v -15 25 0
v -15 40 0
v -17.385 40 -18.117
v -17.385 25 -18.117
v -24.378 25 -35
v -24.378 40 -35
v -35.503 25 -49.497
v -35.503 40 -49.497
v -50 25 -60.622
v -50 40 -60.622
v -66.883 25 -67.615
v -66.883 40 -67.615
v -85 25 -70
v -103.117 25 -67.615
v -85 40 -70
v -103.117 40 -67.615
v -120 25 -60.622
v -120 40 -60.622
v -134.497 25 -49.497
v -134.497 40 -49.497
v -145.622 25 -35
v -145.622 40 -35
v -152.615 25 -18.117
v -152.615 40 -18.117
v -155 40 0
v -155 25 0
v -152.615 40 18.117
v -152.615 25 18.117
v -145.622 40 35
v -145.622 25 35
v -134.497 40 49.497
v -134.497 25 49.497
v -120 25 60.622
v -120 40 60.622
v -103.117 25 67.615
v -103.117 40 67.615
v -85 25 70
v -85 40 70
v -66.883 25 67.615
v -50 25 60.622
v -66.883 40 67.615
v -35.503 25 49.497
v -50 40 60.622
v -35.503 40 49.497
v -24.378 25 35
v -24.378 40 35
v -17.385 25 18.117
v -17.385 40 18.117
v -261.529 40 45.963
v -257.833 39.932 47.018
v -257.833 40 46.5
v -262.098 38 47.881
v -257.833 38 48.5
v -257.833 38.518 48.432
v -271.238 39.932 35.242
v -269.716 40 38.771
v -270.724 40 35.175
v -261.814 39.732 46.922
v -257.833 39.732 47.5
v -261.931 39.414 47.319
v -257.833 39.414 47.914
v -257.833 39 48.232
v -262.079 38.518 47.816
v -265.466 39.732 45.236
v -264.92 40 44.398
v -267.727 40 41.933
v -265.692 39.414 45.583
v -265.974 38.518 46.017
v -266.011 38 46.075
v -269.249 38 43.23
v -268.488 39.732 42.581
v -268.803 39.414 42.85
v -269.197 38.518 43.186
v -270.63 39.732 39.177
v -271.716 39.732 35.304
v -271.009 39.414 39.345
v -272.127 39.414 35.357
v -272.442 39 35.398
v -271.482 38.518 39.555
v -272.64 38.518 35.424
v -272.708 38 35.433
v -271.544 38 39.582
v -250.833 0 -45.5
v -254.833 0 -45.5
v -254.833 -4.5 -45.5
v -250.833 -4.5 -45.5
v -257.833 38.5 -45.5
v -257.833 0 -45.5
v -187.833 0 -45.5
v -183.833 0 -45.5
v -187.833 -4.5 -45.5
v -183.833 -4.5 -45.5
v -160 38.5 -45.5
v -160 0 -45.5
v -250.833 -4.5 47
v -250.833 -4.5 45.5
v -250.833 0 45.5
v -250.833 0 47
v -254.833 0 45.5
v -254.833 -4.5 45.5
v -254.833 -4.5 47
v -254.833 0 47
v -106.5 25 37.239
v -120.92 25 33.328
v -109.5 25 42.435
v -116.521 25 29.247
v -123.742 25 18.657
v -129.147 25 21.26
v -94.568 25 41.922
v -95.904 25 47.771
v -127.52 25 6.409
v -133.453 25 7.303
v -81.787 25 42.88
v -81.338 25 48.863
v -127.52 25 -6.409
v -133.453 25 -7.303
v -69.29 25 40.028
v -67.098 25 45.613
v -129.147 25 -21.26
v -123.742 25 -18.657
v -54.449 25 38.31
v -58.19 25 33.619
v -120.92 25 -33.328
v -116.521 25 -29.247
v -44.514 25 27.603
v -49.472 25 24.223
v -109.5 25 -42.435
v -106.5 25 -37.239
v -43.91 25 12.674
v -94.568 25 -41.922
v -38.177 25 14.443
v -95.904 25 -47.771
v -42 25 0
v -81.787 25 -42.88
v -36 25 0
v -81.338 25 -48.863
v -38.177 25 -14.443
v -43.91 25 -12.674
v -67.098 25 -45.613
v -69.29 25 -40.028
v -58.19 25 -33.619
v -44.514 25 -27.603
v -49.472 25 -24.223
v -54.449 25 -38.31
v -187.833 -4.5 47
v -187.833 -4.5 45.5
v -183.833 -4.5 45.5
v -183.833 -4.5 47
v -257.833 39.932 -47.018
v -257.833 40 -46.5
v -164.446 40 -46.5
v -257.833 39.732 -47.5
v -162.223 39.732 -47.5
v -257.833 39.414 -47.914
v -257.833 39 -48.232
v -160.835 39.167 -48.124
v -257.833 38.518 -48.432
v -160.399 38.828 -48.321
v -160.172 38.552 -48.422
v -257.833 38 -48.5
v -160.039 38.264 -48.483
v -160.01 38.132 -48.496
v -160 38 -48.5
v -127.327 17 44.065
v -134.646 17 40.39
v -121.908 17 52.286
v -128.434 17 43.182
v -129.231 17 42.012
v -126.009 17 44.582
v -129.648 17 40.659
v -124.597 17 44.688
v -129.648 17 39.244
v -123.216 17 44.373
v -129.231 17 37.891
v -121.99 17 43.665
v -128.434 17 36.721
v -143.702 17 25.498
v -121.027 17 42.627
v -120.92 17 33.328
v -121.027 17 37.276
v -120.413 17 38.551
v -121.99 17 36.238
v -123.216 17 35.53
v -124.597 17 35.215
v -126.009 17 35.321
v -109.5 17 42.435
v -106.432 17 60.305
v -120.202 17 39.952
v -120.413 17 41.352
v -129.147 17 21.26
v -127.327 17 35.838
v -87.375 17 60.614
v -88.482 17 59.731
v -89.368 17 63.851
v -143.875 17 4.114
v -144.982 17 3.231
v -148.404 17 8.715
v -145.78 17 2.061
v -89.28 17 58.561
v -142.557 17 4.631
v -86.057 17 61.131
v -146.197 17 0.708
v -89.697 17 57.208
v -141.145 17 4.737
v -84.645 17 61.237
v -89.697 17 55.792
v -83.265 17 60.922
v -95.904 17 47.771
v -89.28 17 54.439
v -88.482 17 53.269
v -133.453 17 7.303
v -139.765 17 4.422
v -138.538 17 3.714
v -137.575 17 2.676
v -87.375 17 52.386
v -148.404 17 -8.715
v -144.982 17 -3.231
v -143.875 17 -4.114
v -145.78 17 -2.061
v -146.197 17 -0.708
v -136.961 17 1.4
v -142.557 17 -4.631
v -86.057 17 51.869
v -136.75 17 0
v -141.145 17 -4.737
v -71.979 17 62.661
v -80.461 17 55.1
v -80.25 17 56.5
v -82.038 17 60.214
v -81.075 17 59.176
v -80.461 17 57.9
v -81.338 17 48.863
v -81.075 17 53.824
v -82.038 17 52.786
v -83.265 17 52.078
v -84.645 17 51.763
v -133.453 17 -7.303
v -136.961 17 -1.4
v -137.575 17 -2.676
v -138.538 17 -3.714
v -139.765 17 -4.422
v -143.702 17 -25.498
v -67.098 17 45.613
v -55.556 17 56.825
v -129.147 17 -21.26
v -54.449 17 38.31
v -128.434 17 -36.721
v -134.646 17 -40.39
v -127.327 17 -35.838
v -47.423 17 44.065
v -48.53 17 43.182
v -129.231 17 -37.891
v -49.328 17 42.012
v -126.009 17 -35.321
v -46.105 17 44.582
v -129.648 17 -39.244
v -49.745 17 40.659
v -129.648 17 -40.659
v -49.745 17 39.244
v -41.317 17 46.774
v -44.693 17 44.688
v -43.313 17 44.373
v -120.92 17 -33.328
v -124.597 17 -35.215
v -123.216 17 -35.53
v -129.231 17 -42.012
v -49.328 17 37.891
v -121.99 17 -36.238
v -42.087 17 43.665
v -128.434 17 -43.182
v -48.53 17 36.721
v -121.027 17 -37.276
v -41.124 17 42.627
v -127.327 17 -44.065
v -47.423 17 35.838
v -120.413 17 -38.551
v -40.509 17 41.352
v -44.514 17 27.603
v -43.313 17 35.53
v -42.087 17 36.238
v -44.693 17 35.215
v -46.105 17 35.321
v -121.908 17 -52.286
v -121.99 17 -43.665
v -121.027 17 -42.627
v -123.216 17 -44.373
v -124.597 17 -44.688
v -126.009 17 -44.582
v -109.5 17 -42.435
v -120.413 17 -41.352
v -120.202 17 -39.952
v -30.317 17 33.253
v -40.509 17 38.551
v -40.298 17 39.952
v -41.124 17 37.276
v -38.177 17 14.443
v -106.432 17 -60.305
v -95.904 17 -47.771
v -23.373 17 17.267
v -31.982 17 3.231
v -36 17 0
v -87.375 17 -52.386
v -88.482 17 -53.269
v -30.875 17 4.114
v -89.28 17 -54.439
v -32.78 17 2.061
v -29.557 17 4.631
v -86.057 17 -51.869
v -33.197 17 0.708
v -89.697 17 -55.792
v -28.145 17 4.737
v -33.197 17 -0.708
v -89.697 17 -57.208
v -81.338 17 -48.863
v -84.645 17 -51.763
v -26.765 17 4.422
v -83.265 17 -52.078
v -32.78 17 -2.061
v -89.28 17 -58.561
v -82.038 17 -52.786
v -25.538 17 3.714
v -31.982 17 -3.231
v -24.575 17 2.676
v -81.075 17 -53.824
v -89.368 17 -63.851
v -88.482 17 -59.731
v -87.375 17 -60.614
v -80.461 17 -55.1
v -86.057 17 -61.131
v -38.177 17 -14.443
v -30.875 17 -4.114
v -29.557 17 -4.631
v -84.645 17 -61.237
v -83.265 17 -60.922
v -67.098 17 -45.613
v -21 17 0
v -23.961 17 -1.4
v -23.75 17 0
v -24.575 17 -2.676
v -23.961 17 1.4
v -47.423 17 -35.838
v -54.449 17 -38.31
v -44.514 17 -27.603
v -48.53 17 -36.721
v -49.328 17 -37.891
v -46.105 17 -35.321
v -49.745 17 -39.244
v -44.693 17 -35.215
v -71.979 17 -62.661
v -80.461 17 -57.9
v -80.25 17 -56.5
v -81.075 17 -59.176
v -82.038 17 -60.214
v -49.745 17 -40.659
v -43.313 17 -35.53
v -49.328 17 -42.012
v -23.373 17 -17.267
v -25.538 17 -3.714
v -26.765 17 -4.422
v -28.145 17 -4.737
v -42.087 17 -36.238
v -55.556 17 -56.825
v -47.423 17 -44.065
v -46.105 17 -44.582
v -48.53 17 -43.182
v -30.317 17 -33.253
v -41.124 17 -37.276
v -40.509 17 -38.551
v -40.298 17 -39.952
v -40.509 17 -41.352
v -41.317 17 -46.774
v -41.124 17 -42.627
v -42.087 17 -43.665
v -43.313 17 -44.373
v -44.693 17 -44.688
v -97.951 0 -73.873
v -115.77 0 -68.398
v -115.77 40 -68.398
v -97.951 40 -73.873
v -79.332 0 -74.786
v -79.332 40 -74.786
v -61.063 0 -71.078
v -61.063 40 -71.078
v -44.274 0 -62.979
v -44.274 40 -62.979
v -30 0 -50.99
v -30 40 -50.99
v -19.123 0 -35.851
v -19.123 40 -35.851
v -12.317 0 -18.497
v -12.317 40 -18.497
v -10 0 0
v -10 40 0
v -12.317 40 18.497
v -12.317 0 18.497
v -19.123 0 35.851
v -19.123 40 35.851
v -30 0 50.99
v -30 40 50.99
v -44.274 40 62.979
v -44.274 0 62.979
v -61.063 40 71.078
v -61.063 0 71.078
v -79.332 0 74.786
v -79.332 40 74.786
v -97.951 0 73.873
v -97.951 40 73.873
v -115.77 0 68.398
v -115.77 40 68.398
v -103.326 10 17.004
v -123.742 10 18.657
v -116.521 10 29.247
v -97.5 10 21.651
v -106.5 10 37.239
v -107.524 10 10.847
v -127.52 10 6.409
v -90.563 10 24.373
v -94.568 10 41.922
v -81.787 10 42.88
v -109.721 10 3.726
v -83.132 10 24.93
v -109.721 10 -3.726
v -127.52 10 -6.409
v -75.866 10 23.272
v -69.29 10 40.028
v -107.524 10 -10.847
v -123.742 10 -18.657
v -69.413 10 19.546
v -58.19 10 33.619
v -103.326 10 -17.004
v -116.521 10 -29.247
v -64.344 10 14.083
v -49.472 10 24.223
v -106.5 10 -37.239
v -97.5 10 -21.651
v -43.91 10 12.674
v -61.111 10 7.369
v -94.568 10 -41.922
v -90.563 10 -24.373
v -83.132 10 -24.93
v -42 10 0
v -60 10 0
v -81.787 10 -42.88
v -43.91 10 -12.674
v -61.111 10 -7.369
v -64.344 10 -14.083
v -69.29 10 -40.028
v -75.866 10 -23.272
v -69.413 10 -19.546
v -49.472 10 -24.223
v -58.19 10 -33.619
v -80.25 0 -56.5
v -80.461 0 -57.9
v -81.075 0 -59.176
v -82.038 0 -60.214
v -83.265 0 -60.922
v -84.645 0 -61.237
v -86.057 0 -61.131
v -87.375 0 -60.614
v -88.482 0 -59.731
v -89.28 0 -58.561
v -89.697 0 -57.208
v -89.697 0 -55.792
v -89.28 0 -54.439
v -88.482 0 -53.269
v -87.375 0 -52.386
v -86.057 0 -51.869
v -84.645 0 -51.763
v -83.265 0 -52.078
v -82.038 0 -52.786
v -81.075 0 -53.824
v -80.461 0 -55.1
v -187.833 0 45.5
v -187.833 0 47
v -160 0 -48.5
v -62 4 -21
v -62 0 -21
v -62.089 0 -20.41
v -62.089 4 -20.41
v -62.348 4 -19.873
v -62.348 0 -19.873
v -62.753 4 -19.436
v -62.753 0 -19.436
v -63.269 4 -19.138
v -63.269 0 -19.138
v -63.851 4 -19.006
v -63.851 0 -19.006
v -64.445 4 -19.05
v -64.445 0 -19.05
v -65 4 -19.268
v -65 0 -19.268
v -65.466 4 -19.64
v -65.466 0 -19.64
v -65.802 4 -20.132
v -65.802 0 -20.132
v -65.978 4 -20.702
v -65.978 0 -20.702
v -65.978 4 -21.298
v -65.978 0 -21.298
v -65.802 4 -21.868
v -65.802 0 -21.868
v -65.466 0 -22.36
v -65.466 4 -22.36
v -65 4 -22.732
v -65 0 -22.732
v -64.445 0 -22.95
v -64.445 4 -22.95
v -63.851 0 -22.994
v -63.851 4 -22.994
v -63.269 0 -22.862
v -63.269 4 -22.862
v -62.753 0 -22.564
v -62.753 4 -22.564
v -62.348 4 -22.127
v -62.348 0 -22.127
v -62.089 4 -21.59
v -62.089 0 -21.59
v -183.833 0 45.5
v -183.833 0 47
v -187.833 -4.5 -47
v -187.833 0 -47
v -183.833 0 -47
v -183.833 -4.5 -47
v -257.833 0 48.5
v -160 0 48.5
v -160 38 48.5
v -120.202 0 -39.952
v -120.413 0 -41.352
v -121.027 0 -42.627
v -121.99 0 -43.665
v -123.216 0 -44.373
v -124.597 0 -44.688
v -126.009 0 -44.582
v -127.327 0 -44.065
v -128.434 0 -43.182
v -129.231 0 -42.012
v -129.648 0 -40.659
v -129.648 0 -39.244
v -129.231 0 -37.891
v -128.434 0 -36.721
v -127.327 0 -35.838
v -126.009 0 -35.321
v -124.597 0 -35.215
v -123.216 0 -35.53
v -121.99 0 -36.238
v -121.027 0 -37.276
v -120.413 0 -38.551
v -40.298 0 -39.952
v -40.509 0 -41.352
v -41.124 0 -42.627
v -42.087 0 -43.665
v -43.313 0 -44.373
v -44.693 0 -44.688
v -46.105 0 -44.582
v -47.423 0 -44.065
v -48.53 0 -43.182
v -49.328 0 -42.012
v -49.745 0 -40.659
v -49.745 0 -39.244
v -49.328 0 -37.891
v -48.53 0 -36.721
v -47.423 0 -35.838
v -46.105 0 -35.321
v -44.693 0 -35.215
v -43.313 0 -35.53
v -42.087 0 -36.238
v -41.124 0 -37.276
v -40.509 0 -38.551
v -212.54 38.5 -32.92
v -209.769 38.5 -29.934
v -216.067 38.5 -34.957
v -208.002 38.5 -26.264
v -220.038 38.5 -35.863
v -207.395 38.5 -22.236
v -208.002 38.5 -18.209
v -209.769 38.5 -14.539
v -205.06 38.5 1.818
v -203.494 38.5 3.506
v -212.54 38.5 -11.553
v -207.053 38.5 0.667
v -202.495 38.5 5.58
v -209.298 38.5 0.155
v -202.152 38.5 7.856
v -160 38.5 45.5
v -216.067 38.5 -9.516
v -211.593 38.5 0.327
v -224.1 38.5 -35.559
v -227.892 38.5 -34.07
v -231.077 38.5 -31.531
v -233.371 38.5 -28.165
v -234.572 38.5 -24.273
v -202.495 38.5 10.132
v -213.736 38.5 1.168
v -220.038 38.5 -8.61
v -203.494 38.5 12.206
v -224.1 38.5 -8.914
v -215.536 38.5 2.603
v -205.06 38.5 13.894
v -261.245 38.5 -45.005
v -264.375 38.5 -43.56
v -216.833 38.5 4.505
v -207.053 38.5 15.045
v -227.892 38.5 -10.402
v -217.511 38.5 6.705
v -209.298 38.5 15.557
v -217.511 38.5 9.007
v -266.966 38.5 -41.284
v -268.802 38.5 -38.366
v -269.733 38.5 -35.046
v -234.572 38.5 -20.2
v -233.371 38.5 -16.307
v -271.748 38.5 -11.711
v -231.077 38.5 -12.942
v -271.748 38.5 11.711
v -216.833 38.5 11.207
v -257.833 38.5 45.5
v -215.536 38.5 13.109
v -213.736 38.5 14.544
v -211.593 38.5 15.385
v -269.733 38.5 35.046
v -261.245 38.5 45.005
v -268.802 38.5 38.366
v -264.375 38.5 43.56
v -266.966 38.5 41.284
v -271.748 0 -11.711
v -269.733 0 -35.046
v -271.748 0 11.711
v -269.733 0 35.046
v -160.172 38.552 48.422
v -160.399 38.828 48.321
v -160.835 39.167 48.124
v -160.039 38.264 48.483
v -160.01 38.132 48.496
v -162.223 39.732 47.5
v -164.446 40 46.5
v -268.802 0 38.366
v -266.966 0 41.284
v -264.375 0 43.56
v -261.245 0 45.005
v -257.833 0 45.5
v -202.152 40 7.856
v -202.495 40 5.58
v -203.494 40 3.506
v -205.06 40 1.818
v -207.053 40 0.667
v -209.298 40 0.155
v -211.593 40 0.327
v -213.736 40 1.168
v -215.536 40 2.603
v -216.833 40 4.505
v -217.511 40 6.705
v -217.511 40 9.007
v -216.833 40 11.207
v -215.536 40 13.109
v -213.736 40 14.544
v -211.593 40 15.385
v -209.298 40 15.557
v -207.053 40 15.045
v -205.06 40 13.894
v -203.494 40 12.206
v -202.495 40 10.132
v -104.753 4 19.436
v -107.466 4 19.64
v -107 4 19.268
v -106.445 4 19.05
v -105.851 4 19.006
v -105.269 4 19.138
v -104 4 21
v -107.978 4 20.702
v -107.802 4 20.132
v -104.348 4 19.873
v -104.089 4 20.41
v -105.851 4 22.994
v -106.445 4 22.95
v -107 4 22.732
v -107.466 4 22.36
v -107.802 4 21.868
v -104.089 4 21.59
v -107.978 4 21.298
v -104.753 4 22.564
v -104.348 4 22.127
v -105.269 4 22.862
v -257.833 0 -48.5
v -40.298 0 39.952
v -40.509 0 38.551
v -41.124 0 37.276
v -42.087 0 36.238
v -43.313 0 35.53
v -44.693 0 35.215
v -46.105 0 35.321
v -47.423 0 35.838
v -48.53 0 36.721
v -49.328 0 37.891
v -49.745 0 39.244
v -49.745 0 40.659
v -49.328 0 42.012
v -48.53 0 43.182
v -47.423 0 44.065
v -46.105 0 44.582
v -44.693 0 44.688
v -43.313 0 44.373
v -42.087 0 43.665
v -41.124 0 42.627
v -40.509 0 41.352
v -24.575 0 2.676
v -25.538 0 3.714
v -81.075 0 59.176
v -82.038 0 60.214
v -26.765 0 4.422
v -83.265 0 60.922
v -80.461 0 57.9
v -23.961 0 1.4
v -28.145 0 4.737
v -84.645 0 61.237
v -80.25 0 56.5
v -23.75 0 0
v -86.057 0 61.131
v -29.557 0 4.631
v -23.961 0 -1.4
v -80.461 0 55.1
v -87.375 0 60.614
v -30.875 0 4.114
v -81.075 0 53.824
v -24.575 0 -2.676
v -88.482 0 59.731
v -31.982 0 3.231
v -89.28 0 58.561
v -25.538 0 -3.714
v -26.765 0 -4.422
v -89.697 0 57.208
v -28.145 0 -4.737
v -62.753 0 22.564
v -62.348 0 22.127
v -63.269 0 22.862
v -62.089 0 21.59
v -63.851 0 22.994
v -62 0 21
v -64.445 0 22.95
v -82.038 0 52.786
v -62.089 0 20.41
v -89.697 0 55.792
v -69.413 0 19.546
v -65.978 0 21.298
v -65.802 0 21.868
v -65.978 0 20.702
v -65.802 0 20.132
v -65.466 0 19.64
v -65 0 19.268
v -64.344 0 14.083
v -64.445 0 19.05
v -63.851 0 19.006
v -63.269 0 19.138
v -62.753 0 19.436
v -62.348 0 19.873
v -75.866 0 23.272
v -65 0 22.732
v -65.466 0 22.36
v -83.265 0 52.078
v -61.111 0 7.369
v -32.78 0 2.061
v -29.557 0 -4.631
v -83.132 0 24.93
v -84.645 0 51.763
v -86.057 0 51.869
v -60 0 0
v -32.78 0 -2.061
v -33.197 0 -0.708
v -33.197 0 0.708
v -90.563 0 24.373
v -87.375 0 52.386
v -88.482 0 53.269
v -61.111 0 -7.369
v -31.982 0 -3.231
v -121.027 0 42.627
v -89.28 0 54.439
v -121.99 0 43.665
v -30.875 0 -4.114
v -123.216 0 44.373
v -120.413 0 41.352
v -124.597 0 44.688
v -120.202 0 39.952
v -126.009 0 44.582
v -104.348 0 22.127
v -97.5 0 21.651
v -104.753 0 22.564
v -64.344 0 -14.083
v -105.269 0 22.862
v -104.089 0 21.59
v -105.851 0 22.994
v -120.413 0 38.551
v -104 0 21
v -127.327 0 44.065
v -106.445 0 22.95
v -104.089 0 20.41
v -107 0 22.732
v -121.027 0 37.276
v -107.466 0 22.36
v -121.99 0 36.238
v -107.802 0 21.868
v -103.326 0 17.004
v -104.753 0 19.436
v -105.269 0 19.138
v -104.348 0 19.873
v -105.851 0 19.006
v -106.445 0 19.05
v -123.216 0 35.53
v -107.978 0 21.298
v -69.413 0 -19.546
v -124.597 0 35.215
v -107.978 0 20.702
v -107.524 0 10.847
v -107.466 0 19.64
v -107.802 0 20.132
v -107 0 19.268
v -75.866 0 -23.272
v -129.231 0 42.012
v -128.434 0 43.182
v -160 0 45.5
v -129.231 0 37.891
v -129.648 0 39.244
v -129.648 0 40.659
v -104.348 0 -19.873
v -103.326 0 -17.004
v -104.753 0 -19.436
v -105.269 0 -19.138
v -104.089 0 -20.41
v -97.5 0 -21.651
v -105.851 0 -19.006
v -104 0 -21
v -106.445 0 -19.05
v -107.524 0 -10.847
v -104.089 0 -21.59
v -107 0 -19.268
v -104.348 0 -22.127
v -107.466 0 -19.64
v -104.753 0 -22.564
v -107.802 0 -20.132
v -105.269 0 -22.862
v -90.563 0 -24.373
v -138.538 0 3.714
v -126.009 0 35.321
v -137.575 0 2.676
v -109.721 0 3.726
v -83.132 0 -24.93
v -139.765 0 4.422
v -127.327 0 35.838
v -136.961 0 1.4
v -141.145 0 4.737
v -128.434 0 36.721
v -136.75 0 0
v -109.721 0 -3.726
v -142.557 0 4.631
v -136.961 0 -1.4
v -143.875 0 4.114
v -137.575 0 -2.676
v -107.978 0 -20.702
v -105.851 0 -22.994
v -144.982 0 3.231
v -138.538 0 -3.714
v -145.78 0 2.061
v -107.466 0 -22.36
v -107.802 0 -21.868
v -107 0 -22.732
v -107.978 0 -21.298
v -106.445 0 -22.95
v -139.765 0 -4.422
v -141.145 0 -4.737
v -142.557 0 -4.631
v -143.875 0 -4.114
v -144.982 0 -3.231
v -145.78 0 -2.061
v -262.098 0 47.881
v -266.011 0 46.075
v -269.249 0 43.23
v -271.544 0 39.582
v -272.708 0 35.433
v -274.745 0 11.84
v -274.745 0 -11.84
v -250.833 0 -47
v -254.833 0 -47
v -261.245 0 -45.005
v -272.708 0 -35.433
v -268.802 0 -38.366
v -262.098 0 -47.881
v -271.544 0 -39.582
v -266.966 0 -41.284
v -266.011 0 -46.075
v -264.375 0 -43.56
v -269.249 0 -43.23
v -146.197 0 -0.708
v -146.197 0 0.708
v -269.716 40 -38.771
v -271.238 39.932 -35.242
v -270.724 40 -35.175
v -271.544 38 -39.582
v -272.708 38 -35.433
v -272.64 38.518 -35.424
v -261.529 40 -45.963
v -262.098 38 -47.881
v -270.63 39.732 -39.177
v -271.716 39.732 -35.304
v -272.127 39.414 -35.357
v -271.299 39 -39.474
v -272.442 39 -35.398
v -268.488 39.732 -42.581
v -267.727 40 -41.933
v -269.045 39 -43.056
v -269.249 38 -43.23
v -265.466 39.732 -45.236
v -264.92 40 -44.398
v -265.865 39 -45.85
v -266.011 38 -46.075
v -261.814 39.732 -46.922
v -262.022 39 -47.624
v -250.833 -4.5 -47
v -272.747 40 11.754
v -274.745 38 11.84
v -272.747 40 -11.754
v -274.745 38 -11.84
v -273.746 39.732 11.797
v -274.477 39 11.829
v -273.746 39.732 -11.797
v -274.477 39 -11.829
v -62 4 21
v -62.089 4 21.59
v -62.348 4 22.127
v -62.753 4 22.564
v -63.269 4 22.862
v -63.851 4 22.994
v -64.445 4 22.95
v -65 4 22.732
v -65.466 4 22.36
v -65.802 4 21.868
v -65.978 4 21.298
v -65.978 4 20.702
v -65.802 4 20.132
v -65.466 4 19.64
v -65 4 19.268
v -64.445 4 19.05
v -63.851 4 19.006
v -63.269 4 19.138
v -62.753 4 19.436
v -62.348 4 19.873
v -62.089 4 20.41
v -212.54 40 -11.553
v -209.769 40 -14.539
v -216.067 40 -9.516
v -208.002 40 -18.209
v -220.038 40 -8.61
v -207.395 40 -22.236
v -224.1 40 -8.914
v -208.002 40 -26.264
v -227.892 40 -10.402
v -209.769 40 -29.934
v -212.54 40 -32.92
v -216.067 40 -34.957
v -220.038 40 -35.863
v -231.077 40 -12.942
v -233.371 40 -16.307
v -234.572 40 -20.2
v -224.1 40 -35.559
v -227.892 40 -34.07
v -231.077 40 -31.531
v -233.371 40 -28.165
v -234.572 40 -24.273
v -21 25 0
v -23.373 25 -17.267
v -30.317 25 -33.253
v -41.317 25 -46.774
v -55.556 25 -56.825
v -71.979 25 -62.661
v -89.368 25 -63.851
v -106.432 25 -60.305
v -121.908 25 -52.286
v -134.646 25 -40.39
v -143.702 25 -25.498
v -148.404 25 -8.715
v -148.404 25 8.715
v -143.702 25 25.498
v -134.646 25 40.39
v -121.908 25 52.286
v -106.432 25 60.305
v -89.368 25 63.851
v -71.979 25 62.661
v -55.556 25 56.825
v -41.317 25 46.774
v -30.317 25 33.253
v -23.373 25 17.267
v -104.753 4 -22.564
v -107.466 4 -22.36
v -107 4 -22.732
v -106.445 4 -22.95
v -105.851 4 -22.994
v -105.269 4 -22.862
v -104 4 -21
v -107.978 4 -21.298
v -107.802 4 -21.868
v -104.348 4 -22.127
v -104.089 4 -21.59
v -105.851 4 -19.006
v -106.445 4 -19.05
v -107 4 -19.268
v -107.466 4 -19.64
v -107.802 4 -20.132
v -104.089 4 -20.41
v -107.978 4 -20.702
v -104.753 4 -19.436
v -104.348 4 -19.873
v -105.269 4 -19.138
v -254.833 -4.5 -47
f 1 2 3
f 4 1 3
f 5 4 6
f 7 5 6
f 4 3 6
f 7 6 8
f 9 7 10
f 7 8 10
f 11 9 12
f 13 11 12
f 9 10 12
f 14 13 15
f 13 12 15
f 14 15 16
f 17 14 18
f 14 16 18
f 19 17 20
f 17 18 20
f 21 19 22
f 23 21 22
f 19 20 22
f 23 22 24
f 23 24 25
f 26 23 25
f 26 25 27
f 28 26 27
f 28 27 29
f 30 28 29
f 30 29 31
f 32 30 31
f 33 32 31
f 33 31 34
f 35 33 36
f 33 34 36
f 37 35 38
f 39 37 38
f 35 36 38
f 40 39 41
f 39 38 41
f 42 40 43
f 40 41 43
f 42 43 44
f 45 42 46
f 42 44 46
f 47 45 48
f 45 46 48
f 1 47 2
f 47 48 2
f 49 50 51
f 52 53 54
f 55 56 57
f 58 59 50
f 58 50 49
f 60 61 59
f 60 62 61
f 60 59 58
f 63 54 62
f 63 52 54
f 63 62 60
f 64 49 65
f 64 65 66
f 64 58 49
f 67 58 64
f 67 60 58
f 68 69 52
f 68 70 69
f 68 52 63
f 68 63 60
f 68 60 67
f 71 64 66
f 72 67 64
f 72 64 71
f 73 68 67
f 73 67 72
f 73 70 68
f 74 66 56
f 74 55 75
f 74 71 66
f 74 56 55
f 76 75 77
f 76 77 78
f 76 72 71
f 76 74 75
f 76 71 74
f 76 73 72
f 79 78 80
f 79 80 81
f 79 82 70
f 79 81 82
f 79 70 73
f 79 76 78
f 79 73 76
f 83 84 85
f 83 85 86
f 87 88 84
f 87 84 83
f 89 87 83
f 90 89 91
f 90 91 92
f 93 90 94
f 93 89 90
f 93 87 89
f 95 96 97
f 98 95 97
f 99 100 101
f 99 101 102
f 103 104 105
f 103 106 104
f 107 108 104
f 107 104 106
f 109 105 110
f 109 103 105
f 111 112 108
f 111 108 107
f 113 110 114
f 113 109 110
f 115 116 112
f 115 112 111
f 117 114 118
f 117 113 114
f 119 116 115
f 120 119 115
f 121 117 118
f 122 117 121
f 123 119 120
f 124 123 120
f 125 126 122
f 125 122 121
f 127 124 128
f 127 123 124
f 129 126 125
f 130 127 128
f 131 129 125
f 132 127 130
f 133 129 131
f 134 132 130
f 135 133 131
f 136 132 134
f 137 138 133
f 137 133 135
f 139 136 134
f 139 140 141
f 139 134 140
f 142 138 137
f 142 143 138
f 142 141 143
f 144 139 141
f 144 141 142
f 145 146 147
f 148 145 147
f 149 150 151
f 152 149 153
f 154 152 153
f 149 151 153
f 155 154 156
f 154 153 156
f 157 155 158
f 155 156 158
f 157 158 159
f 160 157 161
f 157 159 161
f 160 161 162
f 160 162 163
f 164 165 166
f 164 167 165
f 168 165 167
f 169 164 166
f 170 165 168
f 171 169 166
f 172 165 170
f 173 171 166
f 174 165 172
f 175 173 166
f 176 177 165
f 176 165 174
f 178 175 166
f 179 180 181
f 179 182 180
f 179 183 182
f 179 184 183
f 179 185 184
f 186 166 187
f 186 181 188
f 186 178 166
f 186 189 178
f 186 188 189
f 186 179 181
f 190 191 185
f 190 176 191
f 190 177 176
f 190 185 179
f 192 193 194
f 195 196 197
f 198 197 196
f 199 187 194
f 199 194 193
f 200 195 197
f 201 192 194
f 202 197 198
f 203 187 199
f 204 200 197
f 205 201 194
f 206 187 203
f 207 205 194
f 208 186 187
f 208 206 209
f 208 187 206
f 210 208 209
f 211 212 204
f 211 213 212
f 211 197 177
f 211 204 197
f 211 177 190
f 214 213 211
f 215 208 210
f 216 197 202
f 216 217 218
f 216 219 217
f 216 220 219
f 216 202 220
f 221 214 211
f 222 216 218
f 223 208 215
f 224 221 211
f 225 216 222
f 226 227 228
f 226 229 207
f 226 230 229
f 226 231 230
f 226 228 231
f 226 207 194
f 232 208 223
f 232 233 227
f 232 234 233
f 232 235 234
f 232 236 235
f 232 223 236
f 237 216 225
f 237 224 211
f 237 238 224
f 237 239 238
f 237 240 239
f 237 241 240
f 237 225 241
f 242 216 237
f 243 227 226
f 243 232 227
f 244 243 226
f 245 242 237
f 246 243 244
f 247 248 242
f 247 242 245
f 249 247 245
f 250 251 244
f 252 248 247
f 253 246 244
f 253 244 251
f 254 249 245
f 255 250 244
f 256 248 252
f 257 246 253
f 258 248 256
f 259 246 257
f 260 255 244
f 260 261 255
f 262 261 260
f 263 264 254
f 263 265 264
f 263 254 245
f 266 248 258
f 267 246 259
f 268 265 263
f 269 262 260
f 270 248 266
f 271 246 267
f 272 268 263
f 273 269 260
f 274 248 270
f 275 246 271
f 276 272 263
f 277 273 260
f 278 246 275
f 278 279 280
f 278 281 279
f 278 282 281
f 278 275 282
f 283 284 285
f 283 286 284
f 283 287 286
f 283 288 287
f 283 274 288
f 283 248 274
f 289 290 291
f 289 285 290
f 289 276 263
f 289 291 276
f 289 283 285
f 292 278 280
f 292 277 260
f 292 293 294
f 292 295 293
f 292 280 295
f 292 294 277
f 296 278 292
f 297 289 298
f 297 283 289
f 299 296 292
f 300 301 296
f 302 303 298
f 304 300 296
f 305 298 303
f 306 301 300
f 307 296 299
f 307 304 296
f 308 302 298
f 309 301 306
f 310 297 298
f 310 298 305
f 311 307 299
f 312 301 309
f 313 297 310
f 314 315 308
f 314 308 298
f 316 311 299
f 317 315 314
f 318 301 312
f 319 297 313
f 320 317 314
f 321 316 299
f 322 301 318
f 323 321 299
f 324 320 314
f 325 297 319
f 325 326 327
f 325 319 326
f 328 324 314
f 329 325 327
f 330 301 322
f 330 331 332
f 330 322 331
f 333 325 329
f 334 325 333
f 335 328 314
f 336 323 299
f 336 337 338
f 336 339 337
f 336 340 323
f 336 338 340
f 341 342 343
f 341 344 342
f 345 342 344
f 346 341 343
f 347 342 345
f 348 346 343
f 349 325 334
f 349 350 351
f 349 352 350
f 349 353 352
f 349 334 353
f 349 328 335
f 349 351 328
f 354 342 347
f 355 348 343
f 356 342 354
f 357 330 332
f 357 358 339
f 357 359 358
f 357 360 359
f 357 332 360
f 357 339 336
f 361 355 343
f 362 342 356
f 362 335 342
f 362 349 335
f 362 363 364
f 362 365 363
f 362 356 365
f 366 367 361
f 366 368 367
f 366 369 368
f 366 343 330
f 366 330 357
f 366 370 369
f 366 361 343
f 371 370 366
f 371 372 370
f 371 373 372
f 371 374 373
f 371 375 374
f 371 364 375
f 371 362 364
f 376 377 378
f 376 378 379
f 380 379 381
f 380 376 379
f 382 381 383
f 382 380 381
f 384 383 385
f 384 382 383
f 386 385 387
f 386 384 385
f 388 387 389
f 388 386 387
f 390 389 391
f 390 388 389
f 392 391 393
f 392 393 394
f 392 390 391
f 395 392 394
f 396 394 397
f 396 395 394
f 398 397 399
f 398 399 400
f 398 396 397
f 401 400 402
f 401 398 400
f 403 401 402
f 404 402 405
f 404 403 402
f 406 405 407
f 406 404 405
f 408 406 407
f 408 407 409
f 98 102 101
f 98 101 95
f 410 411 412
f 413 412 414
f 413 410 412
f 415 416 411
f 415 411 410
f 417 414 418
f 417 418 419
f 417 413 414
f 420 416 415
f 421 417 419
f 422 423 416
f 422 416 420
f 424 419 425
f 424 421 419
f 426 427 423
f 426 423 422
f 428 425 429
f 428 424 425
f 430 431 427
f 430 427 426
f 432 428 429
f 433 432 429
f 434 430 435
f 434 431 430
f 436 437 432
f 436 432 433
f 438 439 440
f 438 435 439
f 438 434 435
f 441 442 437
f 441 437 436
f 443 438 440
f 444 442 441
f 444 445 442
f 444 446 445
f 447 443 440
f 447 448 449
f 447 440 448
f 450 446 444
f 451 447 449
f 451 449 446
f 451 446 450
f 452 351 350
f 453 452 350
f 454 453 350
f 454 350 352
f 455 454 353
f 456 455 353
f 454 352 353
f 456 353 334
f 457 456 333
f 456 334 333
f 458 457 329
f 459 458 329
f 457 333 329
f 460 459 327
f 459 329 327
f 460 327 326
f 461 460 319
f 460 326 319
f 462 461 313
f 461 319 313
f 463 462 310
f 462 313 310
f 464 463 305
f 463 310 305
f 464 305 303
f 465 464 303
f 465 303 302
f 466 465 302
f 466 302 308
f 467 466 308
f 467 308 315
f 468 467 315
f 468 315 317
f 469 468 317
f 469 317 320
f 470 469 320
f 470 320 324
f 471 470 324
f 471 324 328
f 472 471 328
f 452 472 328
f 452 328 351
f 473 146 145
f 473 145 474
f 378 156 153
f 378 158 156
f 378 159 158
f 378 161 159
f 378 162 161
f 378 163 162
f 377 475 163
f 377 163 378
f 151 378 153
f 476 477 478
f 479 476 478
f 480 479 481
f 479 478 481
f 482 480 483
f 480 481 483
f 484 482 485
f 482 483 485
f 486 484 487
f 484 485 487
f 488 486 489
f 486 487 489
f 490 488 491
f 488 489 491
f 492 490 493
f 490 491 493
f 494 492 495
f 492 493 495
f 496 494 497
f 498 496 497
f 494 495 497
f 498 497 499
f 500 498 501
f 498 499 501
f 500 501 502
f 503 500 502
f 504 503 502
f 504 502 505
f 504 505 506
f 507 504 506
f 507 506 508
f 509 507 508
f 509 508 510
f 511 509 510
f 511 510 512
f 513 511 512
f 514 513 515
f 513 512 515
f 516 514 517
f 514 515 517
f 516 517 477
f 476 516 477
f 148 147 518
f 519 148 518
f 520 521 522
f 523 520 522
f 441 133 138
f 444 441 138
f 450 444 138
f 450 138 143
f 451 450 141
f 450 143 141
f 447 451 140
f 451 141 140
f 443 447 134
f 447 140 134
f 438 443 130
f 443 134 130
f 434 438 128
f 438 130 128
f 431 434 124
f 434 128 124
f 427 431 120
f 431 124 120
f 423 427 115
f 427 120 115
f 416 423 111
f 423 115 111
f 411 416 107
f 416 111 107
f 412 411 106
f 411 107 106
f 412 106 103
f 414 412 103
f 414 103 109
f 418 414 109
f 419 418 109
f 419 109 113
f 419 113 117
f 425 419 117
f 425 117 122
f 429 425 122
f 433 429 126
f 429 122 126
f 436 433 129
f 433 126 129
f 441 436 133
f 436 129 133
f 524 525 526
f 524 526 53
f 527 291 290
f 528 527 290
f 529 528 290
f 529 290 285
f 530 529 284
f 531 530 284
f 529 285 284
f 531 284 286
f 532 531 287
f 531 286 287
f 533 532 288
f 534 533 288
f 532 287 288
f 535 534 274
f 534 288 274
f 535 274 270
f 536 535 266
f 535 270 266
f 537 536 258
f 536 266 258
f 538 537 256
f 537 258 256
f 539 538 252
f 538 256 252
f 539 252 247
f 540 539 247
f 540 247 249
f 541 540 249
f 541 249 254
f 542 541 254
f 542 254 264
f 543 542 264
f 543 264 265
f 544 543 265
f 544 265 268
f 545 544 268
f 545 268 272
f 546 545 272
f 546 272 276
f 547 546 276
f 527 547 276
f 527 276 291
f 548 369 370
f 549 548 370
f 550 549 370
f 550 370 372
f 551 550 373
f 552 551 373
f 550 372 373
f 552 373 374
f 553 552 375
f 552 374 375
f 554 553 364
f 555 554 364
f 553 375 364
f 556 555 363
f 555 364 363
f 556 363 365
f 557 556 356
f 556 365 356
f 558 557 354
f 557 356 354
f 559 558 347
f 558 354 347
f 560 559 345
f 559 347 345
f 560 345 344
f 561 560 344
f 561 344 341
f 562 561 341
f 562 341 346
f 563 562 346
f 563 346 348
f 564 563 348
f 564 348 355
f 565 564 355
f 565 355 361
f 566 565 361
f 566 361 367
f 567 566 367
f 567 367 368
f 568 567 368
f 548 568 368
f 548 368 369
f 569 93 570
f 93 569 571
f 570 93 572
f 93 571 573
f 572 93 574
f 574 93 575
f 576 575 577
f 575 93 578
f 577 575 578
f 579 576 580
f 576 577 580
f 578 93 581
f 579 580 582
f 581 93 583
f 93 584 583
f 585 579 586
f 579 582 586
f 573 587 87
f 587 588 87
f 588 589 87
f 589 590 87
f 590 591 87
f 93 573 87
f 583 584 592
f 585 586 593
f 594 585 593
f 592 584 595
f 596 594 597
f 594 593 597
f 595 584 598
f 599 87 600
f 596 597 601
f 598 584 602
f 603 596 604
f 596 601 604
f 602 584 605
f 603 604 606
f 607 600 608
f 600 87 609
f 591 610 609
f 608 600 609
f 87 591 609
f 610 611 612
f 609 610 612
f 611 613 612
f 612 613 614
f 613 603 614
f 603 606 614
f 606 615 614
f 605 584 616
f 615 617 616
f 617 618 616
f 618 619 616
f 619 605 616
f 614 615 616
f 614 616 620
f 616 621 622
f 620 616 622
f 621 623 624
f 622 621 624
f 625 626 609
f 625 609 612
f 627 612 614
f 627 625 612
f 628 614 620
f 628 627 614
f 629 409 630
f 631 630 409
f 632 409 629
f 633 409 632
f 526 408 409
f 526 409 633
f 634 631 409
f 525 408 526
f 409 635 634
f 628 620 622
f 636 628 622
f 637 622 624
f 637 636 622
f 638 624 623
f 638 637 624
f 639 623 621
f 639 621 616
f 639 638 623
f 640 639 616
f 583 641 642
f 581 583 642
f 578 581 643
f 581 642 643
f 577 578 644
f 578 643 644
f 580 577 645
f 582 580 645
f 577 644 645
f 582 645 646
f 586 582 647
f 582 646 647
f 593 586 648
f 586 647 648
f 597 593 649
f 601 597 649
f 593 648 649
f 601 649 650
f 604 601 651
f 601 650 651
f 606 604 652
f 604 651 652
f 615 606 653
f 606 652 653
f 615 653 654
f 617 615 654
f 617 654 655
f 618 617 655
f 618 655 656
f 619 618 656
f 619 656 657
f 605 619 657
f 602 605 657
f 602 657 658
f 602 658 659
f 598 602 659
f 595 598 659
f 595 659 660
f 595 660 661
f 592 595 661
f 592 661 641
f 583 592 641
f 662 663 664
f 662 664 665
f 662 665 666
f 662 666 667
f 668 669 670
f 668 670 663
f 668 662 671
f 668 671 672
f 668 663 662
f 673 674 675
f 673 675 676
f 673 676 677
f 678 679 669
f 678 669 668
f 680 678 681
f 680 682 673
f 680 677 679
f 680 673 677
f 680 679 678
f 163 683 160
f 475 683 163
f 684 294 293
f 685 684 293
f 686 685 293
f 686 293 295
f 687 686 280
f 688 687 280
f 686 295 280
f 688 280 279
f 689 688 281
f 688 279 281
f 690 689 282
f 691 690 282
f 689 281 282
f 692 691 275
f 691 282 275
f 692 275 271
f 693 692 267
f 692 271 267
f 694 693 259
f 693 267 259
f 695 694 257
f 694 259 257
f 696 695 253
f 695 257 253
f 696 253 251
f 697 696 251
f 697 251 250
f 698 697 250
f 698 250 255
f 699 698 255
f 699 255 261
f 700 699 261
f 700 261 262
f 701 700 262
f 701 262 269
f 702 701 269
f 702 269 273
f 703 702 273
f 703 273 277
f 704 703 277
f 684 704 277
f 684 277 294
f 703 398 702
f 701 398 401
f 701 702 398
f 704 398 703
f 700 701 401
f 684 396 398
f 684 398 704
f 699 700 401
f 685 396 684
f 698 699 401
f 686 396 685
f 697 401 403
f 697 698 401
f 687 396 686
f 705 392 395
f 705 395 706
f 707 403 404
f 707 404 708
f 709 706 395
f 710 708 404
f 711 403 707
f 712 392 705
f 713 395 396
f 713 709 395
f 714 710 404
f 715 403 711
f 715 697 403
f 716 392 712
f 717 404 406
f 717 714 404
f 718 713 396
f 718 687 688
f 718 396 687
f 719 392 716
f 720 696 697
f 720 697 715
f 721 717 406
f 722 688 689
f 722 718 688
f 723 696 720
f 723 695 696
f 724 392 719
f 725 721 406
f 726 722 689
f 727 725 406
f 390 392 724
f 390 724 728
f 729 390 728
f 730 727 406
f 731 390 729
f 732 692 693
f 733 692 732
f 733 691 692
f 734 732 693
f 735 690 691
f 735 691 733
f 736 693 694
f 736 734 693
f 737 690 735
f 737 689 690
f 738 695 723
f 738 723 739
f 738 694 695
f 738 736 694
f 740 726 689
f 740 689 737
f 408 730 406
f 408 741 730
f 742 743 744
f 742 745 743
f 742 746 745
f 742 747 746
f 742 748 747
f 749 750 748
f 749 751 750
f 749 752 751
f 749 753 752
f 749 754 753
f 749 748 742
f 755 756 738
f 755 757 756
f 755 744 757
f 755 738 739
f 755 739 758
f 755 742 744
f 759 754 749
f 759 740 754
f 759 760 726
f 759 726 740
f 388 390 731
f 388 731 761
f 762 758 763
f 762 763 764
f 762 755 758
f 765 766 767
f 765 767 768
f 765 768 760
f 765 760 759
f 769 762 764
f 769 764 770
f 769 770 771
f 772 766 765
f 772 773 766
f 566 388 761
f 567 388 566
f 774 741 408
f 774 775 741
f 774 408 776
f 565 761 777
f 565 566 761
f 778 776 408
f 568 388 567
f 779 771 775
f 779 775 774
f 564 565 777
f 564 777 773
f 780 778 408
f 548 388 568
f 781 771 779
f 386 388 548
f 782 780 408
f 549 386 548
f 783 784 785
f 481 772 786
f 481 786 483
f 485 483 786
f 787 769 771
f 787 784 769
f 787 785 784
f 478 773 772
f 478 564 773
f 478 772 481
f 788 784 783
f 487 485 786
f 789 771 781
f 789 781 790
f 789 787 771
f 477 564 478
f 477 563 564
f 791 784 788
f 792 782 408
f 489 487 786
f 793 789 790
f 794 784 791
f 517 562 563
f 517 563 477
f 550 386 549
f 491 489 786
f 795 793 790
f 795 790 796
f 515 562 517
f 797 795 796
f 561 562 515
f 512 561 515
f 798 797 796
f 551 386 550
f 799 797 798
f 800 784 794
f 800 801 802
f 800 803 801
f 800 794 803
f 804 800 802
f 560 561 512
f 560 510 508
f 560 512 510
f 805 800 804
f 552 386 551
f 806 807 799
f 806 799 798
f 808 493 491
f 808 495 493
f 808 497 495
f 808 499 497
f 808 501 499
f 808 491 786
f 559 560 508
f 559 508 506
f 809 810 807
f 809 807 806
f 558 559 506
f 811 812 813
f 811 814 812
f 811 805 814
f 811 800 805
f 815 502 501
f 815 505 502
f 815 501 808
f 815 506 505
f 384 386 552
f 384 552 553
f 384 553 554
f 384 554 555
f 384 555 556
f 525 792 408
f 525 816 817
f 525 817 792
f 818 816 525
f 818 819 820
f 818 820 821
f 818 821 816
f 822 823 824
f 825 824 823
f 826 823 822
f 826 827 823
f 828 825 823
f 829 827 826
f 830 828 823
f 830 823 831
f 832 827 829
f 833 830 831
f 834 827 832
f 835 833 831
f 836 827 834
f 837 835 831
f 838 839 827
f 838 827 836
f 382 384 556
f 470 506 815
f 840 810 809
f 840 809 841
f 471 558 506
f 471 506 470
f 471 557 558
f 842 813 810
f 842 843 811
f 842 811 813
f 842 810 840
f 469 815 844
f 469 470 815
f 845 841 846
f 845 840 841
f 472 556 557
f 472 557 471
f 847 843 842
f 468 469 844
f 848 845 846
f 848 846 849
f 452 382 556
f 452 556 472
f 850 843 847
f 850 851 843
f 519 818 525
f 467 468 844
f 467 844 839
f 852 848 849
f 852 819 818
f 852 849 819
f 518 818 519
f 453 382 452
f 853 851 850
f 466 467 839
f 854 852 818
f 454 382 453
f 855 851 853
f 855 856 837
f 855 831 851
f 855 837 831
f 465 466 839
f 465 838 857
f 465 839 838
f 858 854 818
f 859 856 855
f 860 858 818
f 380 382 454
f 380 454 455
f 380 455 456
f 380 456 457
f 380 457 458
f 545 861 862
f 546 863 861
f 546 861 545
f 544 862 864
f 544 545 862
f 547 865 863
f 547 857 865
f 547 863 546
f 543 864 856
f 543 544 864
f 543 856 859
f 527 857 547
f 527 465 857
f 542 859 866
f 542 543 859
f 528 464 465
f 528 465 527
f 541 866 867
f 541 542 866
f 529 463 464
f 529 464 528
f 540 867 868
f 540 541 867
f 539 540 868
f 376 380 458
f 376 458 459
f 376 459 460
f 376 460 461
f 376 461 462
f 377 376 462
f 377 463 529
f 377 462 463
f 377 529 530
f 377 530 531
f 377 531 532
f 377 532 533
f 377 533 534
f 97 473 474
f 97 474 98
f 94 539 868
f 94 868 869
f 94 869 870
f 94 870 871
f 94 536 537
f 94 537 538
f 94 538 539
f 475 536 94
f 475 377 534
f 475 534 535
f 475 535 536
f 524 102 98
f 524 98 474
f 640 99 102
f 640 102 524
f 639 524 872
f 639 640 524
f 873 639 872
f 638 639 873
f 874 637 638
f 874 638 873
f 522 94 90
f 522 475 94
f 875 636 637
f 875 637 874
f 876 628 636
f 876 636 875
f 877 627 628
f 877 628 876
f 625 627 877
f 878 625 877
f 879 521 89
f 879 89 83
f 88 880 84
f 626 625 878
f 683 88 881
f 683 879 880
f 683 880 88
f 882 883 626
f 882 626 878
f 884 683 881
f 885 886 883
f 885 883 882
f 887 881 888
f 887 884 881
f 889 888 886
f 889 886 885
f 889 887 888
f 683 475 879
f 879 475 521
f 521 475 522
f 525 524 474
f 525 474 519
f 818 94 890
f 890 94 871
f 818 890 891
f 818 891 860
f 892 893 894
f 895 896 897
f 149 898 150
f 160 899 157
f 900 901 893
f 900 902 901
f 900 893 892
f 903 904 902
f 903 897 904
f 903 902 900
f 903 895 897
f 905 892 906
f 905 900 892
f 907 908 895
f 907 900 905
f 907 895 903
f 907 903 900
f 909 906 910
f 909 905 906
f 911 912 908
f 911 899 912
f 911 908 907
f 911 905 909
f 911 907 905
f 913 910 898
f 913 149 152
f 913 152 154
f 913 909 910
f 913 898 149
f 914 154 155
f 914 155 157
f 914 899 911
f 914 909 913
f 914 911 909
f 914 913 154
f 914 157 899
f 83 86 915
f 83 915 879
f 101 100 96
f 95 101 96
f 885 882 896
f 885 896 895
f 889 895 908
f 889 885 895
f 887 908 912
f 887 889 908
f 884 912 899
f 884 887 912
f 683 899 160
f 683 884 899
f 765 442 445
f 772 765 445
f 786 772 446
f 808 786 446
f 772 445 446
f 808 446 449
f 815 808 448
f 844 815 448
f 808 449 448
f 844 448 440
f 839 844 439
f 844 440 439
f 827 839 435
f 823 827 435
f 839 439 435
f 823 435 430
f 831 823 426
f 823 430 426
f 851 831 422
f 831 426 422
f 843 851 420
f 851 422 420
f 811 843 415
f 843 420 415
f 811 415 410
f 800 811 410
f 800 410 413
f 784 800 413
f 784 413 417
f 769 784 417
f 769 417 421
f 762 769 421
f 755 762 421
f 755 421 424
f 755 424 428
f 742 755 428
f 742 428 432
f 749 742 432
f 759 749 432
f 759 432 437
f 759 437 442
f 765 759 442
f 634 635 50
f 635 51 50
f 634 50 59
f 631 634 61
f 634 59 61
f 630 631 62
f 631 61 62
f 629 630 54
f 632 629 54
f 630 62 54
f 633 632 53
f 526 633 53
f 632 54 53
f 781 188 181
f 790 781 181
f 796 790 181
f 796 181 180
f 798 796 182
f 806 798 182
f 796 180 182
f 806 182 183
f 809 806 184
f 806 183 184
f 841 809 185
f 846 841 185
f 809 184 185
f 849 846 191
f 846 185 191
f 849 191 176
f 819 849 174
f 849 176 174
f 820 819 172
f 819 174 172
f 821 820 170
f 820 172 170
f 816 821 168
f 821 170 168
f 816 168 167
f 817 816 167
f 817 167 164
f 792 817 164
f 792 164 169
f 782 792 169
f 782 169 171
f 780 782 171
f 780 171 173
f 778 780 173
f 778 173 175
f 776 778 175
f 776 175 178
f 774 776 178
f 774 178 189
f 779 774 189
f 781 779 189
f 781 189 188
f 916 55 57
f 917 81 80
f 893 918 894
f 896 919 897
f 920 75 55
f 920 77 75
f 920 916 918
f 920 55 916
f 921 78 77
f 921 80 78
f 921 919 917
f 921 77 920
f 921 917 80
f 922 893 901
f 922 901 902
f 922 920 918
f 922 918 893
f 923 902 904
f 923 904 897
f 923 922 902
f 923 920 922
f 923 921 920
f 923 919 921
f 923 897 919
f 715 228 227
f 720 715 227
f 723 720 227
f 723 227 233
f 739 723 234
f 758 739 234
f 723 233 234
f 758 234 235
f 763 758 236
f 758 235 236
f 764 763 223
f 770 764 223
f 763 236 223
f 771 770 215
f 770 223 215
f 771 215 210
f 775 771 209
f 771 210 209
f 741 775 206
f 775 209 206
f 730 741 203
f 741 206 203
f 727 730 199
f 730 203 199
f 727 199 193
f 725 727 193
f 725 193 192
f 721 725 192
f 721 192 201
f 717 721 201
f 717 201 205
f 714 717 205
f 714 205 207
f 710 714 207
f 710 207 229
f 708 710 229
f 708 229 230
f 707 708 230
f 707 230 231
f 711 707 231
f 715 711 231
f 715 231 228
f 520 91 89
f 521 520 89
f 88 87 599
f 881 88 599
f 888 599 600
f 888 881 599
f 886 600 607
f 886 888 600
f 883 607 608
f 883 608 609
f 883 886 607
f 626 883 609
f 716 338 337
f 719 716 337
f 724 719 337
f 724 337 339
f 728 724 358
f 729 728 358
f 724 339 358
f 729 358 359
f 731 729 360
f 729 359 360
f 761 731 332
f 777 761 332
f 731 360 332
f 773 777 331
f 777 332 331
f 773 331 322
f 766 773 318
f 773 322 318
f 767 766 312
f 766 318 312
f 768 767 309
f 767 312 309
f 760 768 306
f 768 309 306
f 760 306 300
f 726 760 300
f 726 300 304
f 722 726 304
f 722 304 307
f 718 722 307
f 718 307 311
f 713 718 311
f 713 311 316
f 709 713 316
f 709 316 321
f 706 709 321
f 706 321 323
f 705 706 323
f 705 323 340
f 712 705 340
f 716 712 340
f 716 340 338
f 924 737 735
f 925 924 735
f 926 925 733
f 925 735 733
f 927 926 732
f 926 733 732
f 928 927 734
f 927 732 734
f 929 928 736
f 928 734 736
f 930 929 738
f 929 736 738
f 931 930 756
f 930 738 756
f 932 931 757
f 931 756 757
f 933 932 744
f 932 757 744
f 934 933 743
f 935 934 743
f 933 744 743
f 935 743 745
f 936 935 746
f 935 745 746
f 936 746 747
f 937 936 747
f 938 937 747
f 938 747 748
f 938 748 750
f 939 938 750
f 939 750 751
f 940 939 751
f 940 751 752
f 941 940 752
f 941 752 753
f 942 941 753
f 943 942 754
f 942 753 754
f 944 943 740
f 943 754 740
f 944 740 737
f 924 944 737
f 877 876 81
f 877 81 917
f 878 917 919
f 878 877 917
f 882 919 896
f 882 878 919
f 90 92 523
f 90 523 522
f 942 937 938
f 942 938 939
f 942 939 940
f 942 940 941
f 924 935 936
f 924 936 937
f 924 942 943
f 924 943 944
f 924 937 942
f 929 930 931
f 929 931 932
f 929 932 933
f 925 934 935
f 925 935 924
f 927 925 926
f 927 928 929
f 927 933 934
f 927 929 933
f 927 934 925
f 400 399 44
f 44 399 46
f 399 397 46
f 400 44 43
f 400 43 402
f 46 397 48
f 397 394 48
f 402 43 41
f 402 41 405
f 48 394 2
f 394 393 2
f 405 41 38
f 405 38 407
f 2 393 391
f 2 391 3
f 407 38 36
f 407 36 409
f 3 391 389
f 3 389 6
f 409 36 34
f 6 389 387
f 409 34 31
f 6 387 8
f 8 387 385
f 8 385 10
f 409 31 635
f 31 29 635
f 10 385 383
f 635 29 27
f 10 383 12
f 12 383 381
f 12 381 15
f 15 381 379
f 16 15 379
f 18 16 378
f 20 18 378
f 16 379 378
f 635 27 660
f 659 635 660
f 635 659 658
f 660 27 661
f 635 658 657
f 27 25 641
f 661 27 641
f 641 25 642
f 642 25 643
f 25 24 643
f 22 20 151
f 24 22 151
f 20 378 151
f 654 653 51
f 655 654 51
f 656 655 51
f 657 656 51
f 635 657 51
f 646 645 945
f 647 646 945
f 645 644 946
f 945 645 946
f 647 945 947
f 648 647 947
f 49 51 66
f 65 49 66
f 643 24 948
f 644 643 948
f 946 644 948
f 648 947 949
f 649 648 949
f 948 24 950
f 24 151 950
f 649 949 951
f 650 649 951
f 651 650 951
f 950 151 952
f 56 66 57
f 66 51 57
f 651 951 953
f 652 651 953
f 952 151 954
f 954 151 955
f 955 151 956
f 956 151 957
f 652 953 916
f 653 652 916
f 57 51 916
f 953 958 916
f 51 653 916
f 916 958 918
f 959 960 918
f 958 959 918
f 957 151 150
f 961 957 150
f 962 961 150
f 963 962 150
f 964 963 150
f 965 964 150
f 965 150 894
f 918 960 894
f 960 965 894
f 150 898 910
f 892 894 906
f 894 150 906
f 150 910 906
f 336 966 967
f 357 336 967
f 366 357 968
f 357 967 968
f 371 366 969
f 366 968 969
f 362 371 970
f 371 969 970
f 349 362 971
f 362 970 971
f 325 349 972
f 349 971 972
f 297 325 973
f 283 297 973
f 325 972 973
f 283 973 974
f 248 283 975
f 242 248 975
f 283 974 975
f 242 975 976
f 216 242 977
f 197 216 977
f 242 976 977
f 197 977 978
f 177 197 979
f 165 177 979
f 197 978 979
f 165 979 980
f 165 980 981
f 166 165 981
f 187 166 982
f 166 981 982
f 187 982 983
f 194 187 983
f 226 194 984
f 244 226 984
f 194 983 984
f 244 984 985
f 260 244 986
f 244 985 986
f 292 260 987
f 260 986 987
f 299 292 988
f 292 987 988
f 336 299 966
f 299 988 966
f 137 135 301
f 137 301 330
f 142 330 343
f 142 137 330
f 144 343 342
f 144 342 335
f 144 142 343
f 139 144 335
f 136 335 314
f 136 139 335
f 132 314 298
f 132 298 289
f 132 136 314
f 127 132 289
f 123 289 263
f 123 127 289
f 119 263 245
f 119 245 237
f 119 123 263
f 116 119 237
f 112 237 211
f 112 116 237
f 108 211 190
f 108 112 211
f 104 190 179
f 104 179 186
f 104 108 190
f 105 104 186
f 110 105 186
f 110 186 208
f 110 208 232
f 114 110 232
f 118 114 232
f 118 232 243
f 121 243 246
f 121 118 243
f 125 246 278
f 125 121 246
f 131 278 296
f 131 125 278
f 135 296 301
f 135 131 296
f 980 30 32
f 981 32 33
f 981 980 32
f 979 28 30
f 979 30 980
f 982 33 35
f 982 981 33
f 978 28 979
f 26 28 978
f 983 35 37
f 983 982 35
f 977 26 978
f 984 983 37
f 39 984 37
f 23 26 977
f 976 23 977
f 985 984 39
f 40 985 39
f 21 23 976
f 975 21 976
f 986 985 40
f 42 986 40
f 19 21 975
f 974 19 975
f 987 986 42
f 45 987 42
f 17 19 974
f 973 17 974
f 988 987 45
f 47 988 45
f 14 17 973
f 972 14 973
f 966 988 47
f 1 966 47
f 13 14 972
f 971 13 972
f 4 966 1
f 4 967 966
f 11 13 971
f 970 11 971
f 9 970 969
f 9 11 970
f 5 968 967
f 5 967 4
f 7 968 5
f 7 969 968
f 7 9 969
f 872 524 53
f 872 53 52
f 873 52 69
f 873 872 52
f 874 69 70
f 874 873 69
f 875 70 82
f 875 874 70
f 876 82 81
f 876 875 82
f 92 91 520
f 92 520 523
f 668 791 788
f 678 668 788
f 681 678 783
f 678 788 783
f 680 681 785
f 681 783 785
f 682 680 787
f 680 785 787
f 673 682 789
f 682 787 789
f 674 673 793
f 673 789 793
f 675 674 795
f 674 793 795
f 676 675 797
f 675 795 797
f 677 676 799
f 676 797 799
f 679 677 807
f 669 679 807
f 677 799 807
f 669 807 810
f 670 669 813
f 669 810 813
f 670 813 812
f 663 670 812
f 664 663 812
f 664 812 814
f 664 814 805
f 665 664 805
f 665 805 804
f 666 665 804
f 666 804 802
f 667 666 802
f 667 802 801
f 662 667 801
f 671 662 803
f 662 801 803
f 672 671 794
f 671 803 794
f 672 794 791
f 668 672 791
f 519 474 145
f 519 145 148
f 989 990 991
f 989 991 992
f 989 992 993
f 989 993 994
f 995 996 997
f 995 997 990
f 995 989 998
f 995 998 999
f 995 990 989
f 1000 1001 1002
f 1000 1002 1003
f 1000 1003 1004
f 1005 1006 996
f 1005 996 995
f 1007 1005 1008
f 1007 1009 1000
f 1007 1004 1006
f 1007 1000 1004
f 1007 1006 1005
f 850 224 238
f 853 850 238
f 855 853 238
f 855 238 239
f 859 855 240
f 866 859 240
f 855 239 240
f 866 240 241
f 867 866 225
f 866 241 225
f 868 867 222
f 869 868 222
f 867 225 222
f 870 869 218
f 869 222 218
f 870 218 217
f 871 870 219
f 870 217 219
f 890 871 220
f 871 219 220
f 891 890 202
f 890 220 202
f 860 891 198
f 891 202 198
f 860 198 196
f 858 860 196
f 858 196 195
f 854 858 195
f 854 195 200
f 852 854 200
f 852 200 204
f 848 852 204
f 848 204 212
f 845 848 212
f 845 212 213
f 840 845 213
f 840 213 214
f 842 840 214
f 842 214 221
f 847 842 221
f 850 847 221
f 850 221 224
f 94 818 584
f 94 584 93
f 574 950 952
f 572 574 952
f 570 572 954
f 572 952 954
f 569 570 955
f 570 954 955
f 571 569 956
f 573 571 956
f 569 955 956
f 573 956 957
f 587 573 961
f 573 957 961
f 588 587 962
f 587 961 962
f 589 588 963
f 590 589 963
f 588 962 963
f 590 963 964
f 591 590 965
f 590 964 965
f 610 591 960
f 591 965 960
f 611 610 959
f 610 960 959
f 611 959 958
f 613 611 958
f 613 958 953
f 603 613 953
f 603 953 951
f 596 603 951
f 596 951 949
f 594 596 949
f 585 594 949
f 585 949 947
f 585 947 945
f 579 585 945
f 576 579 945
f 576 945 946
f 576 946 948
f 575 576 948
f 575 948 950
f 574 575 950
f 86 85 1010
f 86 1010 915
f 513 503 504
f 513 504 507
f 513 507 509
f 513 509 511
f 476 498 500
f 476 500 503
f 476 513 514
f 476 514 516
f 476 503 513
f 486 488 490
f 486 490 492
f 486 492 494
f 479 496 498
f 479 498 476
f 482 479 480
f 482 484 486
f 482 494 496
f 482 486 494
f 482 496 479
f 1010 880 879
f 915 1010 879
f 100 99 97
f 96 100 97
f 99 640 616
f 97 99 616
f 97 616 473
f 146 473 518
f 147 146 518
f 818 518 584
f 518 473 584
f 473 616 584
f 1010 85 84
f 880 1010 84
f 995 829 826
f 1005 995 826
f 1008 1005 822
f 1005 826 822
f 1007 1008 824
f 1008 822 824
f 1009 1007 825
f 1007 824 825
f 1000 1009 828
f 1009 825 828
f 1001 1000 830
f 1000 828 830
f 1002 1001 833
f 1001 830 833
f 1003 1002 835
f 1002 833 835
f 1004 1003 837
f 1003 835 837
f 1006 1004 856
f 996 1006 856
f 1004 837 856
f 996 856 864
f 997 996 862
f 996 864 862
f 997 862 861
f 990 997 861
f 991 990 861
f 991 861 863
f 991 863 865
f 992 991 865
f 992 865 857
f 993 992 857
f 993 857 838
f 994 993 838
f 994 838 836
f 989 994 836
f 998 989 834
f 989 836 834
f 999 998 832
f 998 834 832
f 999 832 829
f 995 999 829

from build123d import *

# Parameters (mm, degrees)
BOSS_EXTRUDE1_DEPTH = 40
SKETCH2_R           = 70
CUT_EXTRUDE1_DEPTH  = 15
SKETCH3_R           = 64
SKETCH3_R_2         = 49
CUT_EXTRUDE3_DEPTH  = 8
SKETCH4_R           = 4.75
CUT_EXTRUDE4_DEPTH  = 18
SKETCH5_R           = 25
CUT_EXTRUDE5_DEPTH  = 26
SKETCH7_R           = 43
CUT_EXTRUDE6_DEPTH  = 15
CUT_EXTRUDE7_DEPTH  = 38.5
SKETCH9_R           = 13.664776458
SKETCH9_R_2         = 7.722805547
CUT_EXTRUDE8_DEPTH  = 41
FILLET1_R           = 2
SKETCH10_W          = 4
SKETCH10_H          = 9
BOSS_EXTRUDE2_DEPTH = 1.5
SKETCH11_R          = 2
CUT_EXTRUDE9_DEPTH  = 4


with BuildPart() as part:
    # Sketch1 → Boss-Extrude1 (new body)
    with BuildSketch(Plane(origin=(0, 0, 0), x_dir=(1, 0, 0), z_dir=(0, 1, 0))):
        with BuildLine():
            Line((-257.832794656, 48.5), (-160, 48.5))
            Line((-160, 48.5), (-115.769532107, 68.397630762))
            ThreePointArc((-115.769532107, 68.397630762), (-10, 0), (-115.769532107, -68.397630762))
            Line((-115.769532107, -68.397630762), (-160, -48.5))
            Line((-160, -48.5), (-257.832794656, -48.5))
            ThreePointArc((-257.832794656, -48.5), (-267.732532415, -44.769214361), (-272.707763578, -35.432692308))
            ThreePointArc((-272.707763578, -35.432692308), (-275, 0), (-272.707763578, 35.432692308))
            ThreePointArc((-272.707763578, 35.432692308), (-267.732532415, 44.769214361), (-257.832794656, 48.5))
        make_face()
    extrude(amount=BOSS_EXTRUDE1_DEPTH)

    # Sketch2 → Cut-Extrude1 (cut)
    with BuildSketch(Plane(origin=(0, 40, 0), x_dir=(1, 0, 0), z_dir=(0, 1, 0))):
        with Locations((-85, 0)):
            Circle(SKETCH2_R)
    extrude(amount=-CUT_EXTRUDE1_DEPTH, mode=Mode.SUBTRACT)

    # Sketch3 → Cut-Extrude3 (cut)
    with BuildSketch(Plane(origin=(0, 25, 0), x_dir=(1, 0, 0), z_dir=(0, 1, 0))):
        with Locations((-85, 0)):
            Circle(SKETCH3_R)
        with Locations((-85, 0)):
            Circle(SKETCH3_R_2, mode=Mode.SUBTRACT)
    extrude(amount=-CUT_EXTRUDE3_DEPTH, mode=Mode.SUBTRACT)

    # Sketch4 → Cut-Extrude4 (cut, through all)
    with BuildSketch(Plane(origin=(0, 17, 0), x_dir=(1, 0, 0), z_dir=(0, 1, 0))):
        with Locations((-45.048466863, -39.951533137)):
            Circle(SKETCH4_R)
        with Locations((-85, -56.5)):
            Circle(SKETCH4_R)
        with Locations((-28.5, 0)):
            Circle(SKETCH4_R)
        with Locations((-124.951533137, -39.951533137)):
            Circle(SKETCH4_R)
        with Locations((-141.5, 0)):
            Circle(SKETCH4_R)
        with Locations((-124.951533137, 39.951533137)):
            Circle(SKETCH4_R)
        with Locations((-85, 56.5)):
            Circle(SKETCH4_R)
        with Locations((-45.048466863, 39.951533137)):
            Circle(SKETCH4_R)
    extrude(amount=-CUT_EXTRUDE4_DEPTH, mode=Mode.SUBTRACT)

    # Sketch5 → Cut-Extrude5 (cut, through all)
    with BuildSketch(Plane(origin=(0, 25, 0), x_dir=(1, 0, 0), z_dir=(0, 1, 0))):
        with Locations((-85, 0)):
            Circle(SKETCH5_R)
    extrude(amount=-CUT_EXTRUDE5_DEPTH, mode=Mode.SUBTRACT)

    # Sketch7 → Cut-Extrude6 (cut)
    with BuildSketch(Plane(origin=(0, 25, 0), x_dir=(1, 0, 0), z_dir=(0, 1, 0))):
        with Locations((-85, 0)):
            Circle(SKETCH7_R)
    extrude(amount=-CUT_EXTRUDE6_DEPTH, mode=Mode.SUBTRACT)

    # Sketch8 → Cut-Extrude7 (cut)
    with BuildSketch(Plane.XZ):
        with BuildLine():
            Line((-257.832794656, 45.5), (-160, 45.5))
            Line((-160, 45.5), (-160, -45.5))
            Line((-160, -45.5), (-257.832794656, -45.5))
            ThreePointArc((-257.832794656, -45.5), (-265.752584863, -42.515371489), (-269.732769794, -35.046153846))
            ThreePointArc((-269.732769794, -35.046153846), (-272, 0), (-269.732769794, 35.046153846))
            ThreePointArc((-269.732769794, 35.046153846), (-265.752584863, 42.515371489), (-257.832794656, 45.5))
        make_face()
    extrude(amount=-CUT_EXTRUDE7_DEPTH, mode=Mode.SUBTRACT)

    # Sketch9 → Cut-Extrude8 (cut, through all)
    with BuildSketch(Plane(origin=(0, 40, 0), x_dir=(1, 0, 0), z_dir=(0, 1, 0))):
        with Locations((-221.059573663, 22.236353901)):
            Circle(SKETCH9_R)
        with Locations((-209.874820802, -7.855957366)):
            Circle(SKETCH9_R_2)
    extrude(amount=-CUT_EXTRUDE8_DEPTH, mode=Mode.SUBTRACT)

    # Fillet1
    fillet1_edges = [part.edges().sort_by_distance(p)[0] for p in [
        (-267.732532415, 40, 44.769214361),
        (-208.916397328, 40, 48.5),
        (-208.916397328, 40, -48.5),
        (-267.732532415, 40, -44.769214361),
        (-275, 40, 0),
    ]]
    fillet(fillet1_edges, radius=FILLET1_R)

    # Sketch10 → Boss-Extrude2 (add)
    with BuildSketch(Plane.XY.offset(-45.5)):
        with Locations((-252.832794656, 0)):
            Rectangle(SKETCH10_W, SKETCH10_H)
        with Locations((-185.832794656, 0)):
            Rectangle(SKETCH10_W, SKETCH10_H)
    boss_extrude2 = extrude(amount=-BOSS_EXTRUDE2_DEPTH)

    # Mirror1: Boss-Extrude2 across plane
    add(boss_extrude2.mirror(Plane.XY))

    # Sketch11 → Cut-Extrude9 (cut)
    with BuildSketch(Plane.XZ):
        with Locations((-106, 21)):
            Circle(SKETCH11_R)
        with Locations((-64, 21)):
            Circle(SKETCH11_R)
        with Locations((-64, -21)):
            Circle(SKETCH11_R)
        with Locations((-106, -21)):
            Circle(SKETCH11_R)
    extrude(amount=-CUT_EXTRUDE9_DEPTH, mode=Mode.SUBTRACT)


solid = part.part
